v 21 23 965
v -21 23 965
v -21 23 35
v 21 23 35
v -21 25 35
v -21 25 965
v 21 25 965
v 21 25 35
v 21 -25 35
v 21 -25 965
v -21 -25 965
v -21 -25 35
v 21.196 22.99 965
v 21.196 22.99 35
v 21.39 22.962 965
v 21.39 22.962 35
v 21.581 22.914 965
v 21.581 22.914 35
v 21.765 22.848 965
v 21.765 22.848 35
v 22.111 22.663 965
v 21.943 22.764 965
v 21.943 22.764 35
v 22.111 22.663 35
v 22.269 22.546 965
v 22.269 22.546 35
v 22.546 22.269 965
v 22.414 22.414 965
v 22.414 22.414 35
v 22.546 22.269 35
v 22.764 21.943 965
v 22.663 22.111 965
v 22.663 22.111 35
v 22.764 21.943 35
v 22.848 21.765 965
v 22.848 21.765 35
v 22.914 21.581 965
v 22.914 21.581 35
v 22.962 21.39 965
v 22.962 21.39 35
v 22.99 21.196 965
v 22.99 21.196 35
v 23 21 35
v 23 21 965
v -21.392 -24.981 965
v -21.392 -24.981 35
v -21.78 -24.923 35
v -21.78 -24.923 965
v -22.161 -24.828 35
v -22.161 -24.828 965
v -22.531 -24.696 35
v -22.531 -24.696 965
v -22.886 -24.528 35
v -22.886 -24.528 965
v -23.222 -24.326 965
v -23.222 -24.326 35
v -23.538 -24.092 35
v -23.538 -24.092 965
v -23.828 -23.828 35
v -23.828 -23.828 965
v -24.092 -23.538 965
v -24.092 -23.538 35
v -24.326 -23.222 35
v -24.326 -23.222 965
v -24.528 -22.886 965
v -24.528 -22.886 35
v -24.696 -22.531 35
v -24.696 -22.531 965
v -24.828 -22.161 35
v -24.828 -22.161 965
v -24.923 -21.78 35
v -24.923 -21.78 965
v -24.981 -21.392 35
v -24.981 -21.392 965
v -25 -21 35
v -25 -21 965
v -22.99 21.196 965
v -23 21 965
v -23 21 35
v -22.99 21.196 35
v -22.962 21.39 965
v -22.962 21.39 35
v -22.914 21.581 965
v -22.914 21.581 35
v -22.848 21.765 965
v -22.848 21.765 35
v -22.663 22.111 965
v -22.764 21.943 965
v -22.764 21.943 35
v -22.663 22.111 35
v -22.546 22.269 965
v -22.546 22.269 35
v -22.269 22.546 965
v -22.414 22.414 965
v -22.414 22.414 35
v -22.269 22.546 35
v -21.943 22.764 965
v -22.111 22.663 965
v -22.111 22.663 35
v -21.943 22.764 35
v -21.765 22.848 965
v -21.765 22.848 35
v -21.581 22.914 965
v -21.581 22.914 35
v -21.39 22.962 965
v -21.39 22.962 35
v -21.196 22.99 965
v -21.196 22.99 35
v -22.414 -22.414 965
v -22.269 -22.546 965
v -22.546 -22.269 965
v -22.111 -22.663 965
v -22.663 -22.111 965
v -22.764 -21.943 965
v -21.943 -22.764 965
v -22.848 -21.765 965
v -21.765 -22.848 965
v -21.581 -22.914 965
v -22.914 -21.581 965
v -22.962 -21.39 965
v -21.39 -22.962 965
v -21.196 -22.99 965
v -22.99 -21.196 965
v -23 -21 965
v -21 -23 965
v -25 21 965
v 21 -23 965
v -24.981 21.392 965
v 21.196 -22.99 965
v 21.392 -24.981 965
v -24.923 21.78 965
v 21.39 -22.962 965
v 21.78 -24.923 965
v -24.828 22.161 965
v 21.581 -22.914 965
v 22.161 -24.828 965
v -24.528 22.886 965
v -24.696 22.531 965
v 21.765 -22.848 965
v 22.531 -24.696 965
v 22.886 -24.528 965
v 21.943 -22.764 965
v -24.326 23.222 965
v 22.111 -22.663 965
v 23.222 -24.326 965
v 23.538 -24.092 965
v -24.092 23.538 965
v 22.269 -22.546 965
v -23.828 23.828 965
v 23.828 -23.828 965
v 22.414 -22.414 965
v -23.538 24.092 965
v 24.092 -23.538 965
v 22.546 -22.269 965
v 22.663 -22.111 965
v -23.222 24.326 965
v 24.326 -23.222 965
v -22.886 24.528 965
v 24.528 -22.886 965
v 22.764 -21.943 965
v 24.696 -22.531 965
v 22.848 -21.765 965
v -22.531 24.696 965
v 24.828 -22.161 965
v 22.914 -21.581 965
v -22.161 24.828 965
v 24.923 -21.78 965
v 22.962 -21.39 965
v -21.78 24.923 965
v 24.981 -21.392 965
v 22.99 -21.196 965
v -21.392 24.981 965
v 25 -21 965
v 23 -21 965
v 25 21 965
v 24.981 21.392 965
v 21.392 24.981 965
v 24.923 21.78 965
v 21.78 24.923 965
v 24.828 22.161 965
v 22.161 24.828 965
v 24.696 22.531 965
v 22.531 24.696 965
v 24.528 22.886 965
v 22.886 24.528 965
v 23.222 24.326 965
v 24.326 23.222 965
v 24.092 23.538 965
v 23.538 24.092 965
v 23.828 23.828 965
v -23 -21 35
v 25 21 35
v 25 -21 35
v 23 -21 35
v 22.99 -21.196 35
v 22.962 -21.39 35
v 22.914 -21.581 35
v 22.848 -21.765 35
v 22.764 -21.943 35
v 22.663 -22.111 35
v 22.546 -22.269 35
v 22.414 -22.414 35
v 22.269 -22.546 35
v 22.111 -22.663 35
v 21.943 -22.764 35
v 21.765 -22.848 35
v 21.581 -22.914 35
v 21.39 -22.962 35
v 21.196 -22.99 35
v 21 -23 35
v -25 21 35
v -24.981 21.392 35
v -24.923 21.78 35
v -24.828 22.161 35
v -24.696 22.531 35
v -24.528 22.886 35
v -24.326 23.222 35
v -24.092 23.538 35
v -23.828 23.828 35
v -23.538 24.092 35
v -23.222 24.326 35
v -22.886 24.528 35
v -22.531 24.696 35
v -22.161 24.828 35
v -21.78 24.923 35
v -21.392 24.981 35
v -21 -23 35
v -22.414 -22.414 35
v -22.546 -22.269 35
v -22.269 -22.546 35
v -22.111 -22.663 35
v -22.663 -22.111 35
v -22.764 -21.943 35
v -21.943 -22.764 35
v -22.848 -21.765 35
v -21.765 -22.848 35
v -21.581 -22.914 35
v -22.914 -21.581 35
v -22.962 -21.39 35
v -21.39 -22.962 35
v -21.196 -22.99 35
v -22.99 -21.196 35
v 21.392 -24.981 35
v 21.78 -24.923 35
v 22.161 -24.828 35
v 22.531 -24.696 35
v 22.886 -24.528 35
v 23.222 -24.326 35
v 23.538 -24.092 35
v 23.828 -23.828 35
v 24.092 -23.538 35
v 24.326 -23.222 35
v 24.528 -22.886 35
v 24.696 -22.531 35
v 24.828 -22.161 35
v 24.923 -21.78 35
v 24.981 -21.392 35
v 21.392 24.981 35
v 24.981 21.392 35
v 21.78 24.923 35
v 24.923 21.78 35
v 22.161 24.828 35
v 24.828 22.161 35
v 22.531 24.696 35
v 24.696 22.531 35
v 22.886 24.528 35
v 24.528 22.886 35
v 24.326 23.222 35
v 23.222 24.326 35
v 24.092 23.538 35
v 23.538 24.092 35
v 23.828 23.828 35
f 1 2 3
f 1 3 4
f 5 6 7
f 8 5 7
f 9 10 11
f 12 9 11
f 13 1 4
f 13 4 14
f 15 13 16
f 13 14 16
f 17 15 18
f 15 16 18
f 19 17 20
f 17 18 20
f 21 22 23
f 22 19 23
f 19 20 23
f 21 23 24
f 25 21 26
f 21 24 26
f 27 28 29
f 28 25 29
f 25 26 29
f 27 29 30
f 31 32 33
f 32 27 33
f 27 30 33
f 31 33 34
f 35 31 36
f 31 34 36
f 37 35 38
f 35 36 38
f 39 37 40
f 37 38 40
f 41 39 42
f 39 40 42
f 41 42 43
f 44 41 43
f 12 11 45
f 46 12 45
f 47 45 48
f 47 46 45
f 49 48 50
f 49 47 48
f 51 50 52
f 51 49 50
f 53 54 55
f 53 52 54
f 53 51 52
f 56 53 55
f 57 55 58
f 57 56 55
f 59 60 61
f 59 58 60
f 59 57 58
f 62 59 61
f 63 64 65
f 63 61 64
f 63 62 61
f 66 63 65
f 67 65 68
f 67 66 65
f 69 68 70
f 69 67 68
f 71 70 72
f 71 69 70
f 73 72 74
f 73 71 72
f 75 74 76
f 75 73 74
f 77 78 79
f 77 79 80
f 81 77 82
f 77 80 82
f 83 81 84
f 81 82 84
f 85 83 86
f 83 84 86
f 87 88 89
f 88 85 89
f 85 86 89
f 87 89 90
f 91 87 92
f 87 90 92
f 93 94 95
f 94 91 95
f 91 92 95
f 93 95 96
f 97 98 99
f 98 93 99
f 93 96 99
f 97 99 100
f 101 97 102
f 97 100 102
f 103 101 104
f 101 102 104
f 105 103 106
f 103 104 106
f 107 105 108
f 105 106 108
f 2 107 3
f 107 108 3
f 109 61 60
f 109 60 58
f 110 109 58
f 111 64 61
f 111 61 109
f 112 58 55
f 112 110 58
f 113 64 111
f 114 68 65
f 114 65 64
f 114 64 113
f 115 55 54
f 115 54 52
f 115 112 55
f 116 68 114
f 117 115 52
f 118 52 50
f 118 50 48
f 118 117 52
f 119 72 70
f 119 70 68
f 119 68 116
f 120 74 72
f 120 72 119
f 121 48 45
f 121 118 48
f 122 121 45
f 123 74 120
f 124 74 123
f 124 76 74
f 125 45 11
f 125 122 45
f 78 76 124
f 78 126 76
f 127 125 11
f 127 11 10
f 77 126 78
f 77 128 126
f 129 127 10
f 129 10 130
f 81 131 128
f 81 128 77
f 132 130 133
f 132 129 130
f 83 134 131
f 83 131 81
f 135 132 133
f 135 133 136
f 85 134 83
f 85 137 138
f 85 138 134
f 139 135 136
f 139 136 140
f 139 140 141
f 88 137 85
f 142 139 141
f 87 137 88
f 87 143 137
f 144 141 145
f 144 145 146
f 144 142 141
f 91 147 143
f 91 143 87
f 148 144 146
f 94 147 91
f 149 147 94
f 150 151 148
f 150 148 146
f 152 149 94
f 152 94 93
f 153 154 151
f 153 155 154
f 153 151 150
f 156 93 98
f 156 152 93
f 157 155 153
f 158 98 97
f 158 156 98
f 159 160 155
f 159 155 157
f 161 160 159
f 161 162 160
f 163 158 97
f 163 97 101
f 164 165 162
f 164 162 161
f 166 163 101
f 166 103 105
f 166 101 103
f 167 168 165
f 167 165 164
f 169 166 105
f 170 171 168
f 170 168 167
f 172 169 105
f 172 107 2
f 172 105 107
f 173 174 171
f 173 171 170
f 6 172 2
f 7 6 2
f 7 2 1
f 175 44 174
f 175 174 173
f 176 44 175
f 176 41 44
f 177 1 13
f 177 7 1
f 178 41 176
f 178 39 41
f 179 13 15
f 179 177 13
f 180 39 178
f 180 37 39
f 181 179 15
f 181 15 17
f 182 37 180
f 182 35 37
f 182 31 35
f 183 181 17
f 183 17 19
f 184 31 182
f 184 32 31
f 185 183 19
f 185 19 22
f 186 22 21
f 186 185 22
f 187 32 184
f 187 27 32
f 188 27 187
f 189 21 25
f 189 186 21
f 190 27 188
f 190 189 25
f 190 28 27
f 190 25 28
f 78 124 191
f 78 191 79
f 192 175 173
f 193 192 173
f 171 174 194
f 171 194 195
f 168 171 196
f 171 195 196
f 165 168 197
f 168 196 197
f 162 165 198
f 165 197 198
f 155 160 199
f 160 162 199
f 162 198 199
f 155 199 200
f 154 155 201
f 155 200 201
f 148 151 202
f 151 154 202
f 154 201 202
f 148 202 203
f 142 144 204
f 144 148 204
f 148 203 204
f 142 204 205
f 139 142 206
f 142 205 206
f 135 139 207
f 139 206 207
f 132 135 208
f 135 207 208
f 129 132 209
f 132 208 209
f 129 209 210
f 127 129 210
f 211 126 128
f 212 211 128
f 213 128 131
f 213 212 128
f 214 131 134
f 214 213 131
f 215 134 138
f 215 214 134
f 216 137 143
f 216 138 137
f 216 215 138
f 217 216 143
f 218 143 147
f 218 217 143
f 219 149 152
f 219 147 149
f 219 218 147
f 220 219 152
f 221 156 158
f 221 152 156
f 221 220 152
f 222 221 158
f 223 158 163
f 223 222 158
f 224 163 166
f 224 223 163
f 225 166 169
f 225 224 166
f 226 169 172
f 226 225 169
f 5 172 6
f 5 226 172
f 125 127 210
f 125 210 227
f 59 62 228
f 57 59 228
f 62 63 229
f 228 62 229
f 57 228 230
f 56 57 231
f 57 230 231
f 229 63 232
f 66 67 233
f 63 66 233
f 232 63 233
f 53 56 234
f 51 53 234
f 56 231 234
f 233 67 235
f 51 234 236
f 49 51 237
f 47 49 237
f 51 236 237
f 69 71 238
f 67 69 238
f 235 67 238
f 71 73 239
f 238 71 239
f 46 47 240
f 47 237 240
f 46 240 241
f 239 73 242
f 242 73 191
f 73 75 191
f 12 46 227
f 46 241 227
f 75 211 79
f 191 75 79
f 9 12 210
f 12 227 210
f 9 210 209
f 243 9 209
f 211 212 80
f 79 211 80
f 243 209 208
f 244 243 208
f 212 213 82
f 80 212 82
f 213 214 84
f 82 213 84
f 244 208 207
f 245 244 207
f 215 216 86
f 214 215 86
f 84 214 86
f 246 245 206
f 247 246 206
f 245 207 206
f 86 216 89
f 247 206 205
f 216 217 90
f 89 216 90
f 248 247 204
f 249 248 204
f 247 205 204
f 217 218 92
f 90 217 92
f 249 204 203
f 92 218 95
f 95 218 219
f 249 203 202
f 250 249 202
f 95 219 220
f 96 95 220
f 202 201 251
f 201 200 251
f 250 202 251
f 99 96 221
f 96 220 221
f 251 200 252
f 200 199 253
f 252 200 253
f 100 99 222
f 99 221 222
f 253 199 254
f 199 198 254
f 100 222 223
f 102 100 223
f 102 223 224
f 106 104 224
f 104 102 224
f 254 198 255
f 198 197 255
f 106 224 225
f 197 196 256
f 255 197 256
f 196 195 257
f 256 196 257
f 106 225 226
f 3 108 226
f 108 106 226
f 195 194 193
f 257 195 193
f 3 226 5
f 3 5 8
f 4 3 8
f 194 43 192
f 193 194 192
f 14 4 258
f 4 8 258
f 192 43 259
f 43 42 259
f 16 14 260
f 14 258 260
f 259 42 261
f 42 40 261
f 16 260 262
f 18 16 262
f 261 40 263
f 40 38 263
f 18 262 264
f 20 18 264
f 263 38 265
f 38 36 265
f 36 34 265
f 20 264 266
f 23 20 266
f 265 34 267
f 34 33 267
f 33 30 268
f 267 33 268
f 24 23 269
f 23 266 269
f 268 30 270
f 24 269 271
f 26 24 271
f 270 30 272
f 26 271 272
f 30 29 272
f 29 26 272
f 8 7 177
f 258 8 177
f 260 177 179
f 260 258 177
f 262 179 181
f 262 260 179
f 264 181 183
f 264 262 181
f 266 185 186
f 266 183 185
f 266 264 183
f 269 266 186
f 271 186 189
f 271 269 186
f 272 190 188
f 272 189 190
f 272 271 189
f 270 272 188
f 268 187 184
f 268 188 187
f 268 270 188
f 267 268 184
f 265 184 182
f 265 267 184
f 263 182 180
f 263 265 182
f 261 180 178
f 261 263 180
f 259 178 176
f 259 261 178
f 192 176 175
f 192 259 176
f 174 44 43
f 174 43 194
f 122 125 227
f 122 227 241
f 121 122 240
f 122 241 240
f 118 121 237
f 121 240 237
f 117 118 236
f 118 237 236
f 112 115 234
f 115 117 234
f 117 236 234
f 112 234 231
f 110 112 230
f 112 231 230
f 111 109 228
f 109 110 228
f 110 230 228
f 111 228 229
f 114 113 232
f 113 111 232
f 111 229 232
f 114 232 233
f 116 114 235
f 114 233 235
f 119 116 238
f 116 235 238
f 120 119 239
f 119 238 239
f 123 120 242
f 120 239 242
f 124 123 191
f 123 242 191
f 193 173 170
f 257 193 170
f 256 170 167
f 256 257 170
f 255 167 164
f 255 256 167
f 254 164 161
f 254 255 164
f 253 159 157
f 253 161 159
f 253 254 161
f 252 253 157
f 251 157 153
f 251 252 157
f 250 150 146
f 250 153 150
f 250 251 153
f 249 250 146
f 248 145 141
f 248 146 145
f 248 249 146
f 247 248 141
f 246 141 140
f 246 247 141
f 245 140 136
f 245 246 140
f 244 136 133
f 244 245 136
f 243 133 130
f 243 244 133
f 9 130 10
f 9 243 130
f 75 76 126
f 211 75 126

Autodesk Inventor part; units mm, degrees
ref_plane "Plano inicial" through (0, 0, 35) normal (0, 0, 1) x (1, 0, 0)
ref_plane "Plano final" through (0, 0, 965) normal (0, 0, 1) x (1, 0, 0)
sketch "Boceto" plane through (0, 0, 0) normal (0, 0, 1) x (1, 0, 0)
  line L0 (-25, -21) -> (-25, 21)
  line L1 (-21, 25) -> (21, 25)
  line L2 (25, 21) -> (25, -21)
  line L3 (21, -25) -> (-21, -25)
  arc A0 (-25, -21) -> (-21, -25) centre (-21, -21) ccw
  arc A1 (25, 21) -> (21, 25) centre (21, 21) ccw
  arc A2 (-21, 25) -> (-25, 21) centre (-21, 21) ccw
  arc A3 (21, -25) -> (25, -21) centre (21, -21) ccw
  arc A4 (-21, 23) -> (-23, 21) centre (-21, 21) ccw
  line L4 (-21, 23) -> (21, 23)
  arc A5 (23, 21) -> (21, 23) centre (21, 21) ccw
  line L5 (23, 21) -> (23, -21)
  arc A6 (21, -23) -> (23, -21) centre (21, -21) ccw
  line L6 (21, -23) -> (-21, -23)
  arc A7 (-23, -21) -> (-21, -23) centre (-21, -21) ccw
  line L7 (-23, -21) -> (-23, 21)
  line L8 (0, 36.1598) -> (0, -36.1598) construction
  line L9 (-36.1598, 0) -> (36.1598, 0) construction
  dimension "d7" = 4
  dimension "d9" = 50
  dimension "d11" = 50
  dimension "d12" = 2
  dimension "d15" = 25
  dimension "d16" = 25
extrude "Cuerpo" add sketch "Boceto" along normal up to surface (930 mm away) from surface at 35
sketch "Sketch3" plane through (0, 0, 0) normal (0, 0, 1) x (1, 0, 0)
  line L0 (0, 0) -> (10, 0)
ref_plane "Work Plane3" through (0, 0, 0) normal (0, -1, 0) x (1, 0, 0)
sketch "Sketch4" plane through (0, 0, 0) normal (0, -1, 0) x (1, 0, 0)
  line L0 (-2, 35) -> (12, 35)
  line L1 (-2, 965) -> (12, 965)
  dimension "d18" = 930
ref_plane "Plano de trabajo4" through (0, 29, 965) normal (0, 0, 1) x (1, 0, 0)
split "Dividir1" plane through (0, 29, 965) removes the side toward (0, 0, 1)
ref_plane "Plano de trabajo5" through (0, -29, 35) normal (0, 0, -1) x (-1, 0, 0)
split "Dividir2" plane through (0, -29, 35) removes the side toward (0, 0, -1)
equation "\"d7\" = G_IR"
equation "\"d9\" = G_W"
equation "\"d11\" = G_H"
equation "\"d12\" = G_T"
equation "\"d15\" = 0.5 * d9"
equation "\"d16\" = 0.5 * d11"
equation "\"d3\" = G_L"
equation "\"G_W\" = 50"
equation "\"G_H\" = 50"
equation "\"G_T\" = 2"
equation "\"G_IR\" = 4"
equation "\"G_L\" = d18"
equation "\"G_OFFSET_START\" = -35"
equation "\"G_OFFSET_END\" = 465"
equation "\"d13\" = -G_OFFSET_START"
equation "\"d14\" = G_OFFSET_END + B_L"
equation "\"B_L\" = 500"
properties part number "ISO 10799-2 - 50x50x2 - 930" material "Galvanizado catalogo 1"
